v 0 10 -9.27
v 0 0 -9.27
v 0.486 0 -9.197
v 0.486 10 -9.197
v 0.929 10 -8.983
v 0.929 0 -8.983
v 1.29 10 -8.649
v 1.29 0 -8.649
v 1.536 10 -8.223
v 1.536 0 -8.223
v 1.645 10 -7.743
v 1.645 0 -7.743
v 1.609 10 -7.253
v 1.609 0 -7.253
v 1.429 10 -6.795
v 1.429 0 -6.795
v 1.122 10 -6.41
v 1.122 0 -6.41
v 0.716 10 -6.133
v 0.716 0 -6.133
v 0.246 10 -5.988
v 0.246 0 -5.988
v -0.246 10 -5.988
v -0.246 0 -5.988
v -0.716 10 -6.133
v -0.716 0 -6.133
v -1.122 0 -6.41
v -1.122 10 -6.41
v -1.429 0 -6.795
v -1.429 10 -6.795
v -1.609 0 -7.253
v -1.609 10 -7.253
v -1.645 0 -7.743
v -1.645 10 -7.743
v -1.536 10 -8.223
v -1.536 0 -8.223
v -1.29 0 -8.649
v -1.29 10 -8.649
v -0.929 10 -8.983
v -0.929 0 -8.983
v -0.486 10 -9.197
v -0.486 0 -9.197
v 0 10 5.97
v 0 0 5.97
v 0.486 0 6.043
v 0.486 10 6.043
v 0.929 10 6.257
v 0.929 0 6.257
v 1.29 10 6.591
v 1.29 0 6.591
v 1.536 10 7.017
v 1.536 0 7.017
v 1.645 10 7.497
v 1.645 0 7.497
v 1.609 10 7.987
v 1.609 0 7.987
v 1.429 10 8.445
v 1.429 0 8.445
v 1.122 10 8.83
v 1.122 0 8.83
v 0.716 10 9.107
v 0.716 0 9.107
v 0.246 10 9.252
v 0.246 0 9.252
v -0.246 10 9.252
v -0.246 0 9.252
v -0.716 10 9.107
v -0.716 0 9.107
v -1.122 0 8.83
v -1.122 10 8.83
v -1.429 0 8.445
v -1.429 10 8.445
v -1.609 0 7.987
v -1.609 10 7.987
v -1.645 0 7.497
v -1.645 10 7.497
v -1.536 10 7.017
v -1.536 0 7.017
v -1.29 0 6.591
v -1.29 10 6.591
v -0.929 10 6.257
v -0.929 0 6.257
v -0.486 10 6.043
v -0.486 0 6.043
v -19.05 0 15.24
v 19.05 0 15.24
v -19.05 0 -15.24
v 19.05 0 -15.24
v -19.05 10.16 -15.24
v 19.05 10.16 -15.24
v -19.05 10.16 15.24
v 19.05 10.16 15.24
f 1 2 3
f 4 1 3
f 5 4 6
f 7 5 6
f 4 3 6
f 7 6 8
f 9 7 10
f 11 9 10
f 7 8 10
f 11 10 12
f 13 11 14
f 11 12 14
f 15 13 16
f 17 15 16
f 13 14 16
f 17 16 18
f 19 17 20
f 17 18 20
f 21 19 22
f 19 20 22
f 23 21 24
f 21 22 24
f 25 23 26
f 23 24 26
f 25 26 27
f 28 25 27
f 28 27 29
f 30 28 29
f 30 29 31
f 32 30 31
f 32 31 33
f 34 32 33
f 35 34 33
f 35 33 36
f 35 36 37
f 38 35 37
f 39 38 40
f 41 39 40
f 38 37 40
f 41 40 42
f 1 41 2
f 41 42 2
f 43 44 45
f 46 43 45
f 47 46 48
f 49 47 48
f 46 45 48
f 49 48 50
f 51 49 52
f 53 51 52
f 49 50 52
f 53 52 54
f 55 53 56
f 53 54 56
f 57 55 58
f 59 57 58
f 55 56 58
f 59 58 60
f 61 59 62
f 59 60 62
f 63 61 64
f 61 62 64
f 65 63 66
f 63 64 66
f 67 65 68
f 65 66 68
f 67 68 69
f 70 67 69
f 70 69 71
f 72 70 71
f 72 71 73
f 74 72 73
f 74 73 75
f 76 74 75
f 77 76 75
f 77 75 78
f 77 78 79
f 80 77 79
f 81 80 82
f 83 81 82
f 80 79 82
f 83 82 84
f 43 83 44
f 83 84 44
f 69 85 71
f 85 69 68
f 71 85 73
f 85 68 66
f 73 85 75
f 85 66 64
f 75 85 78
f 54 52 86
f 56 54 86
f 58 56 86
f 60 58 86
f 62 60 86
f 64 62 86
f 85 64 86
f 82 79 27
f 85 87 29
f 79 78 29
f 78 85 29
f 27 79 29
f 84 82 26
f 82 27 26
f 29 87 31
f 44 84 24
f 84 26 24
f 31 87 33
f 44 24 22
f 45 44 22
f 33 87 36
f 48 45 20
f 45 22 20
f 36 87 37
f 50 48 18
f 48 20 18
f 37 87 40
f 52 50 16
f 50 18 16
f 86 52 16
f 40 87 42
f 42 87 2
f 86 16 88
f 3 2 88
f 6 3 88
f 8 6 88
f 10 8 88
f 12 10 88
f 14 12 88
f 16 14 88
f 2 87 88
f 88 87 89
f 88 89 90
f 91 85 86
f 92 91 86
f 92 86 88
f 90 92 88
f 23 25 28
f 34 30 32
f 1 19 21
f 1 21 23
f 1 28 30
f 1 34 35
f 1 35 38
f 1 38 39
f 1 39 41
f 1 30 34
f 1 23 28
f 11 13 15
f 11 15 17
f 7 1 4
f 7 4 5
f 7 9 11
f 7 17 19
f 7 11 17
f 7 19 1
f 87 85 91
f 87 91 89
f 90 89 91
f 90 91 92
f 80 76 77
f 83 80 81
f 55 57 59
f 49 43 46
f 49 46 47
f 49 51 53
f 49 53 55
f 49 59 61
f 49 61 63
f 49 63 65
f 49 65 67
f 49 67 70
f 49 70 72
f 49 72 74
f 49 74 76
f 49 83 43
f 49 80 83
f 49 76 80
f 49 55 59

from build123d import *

# Parameters (mm, degrees)
SKETCH1_W           = 38.1
SKETCH1_H           = 30.48
BOSS_EXTRUDE1_DEPTH = 10.16
SKETCH3_R           = 1.65
CUT_EXTRUDE1_DEPTH  = 10


with BuildPart() as part:
    # Sketch1 → Boss-Extrude1 (new body)
    with BuildSketch(Plane(origin=(0, 0, 0), x_dir=(1, 0, 0), z_dir=(0, 1, 0))):
        Rectangle(SKETCH1_W, SKETCH1_H)
    extrude(amount=BOSS_EXTRUDE1_DEPTH)

    # Sketch3 → Cut-Extrude1 (cut)
    with BuildSketch(Plane.XZ):
        with Locations(Location((0, 7.62, 0), (0, 0, 270))):
            Circle(SKETCH3_R)
        with Locations(Location((0, -7.62, 0), (0, 0, 270))):
            Circle(SKETCH3_R)
    extrude(amount=-CUT_EXTRUDE1_DEPTH, mode=Mode.SUBTRACT)


solid = part.part
